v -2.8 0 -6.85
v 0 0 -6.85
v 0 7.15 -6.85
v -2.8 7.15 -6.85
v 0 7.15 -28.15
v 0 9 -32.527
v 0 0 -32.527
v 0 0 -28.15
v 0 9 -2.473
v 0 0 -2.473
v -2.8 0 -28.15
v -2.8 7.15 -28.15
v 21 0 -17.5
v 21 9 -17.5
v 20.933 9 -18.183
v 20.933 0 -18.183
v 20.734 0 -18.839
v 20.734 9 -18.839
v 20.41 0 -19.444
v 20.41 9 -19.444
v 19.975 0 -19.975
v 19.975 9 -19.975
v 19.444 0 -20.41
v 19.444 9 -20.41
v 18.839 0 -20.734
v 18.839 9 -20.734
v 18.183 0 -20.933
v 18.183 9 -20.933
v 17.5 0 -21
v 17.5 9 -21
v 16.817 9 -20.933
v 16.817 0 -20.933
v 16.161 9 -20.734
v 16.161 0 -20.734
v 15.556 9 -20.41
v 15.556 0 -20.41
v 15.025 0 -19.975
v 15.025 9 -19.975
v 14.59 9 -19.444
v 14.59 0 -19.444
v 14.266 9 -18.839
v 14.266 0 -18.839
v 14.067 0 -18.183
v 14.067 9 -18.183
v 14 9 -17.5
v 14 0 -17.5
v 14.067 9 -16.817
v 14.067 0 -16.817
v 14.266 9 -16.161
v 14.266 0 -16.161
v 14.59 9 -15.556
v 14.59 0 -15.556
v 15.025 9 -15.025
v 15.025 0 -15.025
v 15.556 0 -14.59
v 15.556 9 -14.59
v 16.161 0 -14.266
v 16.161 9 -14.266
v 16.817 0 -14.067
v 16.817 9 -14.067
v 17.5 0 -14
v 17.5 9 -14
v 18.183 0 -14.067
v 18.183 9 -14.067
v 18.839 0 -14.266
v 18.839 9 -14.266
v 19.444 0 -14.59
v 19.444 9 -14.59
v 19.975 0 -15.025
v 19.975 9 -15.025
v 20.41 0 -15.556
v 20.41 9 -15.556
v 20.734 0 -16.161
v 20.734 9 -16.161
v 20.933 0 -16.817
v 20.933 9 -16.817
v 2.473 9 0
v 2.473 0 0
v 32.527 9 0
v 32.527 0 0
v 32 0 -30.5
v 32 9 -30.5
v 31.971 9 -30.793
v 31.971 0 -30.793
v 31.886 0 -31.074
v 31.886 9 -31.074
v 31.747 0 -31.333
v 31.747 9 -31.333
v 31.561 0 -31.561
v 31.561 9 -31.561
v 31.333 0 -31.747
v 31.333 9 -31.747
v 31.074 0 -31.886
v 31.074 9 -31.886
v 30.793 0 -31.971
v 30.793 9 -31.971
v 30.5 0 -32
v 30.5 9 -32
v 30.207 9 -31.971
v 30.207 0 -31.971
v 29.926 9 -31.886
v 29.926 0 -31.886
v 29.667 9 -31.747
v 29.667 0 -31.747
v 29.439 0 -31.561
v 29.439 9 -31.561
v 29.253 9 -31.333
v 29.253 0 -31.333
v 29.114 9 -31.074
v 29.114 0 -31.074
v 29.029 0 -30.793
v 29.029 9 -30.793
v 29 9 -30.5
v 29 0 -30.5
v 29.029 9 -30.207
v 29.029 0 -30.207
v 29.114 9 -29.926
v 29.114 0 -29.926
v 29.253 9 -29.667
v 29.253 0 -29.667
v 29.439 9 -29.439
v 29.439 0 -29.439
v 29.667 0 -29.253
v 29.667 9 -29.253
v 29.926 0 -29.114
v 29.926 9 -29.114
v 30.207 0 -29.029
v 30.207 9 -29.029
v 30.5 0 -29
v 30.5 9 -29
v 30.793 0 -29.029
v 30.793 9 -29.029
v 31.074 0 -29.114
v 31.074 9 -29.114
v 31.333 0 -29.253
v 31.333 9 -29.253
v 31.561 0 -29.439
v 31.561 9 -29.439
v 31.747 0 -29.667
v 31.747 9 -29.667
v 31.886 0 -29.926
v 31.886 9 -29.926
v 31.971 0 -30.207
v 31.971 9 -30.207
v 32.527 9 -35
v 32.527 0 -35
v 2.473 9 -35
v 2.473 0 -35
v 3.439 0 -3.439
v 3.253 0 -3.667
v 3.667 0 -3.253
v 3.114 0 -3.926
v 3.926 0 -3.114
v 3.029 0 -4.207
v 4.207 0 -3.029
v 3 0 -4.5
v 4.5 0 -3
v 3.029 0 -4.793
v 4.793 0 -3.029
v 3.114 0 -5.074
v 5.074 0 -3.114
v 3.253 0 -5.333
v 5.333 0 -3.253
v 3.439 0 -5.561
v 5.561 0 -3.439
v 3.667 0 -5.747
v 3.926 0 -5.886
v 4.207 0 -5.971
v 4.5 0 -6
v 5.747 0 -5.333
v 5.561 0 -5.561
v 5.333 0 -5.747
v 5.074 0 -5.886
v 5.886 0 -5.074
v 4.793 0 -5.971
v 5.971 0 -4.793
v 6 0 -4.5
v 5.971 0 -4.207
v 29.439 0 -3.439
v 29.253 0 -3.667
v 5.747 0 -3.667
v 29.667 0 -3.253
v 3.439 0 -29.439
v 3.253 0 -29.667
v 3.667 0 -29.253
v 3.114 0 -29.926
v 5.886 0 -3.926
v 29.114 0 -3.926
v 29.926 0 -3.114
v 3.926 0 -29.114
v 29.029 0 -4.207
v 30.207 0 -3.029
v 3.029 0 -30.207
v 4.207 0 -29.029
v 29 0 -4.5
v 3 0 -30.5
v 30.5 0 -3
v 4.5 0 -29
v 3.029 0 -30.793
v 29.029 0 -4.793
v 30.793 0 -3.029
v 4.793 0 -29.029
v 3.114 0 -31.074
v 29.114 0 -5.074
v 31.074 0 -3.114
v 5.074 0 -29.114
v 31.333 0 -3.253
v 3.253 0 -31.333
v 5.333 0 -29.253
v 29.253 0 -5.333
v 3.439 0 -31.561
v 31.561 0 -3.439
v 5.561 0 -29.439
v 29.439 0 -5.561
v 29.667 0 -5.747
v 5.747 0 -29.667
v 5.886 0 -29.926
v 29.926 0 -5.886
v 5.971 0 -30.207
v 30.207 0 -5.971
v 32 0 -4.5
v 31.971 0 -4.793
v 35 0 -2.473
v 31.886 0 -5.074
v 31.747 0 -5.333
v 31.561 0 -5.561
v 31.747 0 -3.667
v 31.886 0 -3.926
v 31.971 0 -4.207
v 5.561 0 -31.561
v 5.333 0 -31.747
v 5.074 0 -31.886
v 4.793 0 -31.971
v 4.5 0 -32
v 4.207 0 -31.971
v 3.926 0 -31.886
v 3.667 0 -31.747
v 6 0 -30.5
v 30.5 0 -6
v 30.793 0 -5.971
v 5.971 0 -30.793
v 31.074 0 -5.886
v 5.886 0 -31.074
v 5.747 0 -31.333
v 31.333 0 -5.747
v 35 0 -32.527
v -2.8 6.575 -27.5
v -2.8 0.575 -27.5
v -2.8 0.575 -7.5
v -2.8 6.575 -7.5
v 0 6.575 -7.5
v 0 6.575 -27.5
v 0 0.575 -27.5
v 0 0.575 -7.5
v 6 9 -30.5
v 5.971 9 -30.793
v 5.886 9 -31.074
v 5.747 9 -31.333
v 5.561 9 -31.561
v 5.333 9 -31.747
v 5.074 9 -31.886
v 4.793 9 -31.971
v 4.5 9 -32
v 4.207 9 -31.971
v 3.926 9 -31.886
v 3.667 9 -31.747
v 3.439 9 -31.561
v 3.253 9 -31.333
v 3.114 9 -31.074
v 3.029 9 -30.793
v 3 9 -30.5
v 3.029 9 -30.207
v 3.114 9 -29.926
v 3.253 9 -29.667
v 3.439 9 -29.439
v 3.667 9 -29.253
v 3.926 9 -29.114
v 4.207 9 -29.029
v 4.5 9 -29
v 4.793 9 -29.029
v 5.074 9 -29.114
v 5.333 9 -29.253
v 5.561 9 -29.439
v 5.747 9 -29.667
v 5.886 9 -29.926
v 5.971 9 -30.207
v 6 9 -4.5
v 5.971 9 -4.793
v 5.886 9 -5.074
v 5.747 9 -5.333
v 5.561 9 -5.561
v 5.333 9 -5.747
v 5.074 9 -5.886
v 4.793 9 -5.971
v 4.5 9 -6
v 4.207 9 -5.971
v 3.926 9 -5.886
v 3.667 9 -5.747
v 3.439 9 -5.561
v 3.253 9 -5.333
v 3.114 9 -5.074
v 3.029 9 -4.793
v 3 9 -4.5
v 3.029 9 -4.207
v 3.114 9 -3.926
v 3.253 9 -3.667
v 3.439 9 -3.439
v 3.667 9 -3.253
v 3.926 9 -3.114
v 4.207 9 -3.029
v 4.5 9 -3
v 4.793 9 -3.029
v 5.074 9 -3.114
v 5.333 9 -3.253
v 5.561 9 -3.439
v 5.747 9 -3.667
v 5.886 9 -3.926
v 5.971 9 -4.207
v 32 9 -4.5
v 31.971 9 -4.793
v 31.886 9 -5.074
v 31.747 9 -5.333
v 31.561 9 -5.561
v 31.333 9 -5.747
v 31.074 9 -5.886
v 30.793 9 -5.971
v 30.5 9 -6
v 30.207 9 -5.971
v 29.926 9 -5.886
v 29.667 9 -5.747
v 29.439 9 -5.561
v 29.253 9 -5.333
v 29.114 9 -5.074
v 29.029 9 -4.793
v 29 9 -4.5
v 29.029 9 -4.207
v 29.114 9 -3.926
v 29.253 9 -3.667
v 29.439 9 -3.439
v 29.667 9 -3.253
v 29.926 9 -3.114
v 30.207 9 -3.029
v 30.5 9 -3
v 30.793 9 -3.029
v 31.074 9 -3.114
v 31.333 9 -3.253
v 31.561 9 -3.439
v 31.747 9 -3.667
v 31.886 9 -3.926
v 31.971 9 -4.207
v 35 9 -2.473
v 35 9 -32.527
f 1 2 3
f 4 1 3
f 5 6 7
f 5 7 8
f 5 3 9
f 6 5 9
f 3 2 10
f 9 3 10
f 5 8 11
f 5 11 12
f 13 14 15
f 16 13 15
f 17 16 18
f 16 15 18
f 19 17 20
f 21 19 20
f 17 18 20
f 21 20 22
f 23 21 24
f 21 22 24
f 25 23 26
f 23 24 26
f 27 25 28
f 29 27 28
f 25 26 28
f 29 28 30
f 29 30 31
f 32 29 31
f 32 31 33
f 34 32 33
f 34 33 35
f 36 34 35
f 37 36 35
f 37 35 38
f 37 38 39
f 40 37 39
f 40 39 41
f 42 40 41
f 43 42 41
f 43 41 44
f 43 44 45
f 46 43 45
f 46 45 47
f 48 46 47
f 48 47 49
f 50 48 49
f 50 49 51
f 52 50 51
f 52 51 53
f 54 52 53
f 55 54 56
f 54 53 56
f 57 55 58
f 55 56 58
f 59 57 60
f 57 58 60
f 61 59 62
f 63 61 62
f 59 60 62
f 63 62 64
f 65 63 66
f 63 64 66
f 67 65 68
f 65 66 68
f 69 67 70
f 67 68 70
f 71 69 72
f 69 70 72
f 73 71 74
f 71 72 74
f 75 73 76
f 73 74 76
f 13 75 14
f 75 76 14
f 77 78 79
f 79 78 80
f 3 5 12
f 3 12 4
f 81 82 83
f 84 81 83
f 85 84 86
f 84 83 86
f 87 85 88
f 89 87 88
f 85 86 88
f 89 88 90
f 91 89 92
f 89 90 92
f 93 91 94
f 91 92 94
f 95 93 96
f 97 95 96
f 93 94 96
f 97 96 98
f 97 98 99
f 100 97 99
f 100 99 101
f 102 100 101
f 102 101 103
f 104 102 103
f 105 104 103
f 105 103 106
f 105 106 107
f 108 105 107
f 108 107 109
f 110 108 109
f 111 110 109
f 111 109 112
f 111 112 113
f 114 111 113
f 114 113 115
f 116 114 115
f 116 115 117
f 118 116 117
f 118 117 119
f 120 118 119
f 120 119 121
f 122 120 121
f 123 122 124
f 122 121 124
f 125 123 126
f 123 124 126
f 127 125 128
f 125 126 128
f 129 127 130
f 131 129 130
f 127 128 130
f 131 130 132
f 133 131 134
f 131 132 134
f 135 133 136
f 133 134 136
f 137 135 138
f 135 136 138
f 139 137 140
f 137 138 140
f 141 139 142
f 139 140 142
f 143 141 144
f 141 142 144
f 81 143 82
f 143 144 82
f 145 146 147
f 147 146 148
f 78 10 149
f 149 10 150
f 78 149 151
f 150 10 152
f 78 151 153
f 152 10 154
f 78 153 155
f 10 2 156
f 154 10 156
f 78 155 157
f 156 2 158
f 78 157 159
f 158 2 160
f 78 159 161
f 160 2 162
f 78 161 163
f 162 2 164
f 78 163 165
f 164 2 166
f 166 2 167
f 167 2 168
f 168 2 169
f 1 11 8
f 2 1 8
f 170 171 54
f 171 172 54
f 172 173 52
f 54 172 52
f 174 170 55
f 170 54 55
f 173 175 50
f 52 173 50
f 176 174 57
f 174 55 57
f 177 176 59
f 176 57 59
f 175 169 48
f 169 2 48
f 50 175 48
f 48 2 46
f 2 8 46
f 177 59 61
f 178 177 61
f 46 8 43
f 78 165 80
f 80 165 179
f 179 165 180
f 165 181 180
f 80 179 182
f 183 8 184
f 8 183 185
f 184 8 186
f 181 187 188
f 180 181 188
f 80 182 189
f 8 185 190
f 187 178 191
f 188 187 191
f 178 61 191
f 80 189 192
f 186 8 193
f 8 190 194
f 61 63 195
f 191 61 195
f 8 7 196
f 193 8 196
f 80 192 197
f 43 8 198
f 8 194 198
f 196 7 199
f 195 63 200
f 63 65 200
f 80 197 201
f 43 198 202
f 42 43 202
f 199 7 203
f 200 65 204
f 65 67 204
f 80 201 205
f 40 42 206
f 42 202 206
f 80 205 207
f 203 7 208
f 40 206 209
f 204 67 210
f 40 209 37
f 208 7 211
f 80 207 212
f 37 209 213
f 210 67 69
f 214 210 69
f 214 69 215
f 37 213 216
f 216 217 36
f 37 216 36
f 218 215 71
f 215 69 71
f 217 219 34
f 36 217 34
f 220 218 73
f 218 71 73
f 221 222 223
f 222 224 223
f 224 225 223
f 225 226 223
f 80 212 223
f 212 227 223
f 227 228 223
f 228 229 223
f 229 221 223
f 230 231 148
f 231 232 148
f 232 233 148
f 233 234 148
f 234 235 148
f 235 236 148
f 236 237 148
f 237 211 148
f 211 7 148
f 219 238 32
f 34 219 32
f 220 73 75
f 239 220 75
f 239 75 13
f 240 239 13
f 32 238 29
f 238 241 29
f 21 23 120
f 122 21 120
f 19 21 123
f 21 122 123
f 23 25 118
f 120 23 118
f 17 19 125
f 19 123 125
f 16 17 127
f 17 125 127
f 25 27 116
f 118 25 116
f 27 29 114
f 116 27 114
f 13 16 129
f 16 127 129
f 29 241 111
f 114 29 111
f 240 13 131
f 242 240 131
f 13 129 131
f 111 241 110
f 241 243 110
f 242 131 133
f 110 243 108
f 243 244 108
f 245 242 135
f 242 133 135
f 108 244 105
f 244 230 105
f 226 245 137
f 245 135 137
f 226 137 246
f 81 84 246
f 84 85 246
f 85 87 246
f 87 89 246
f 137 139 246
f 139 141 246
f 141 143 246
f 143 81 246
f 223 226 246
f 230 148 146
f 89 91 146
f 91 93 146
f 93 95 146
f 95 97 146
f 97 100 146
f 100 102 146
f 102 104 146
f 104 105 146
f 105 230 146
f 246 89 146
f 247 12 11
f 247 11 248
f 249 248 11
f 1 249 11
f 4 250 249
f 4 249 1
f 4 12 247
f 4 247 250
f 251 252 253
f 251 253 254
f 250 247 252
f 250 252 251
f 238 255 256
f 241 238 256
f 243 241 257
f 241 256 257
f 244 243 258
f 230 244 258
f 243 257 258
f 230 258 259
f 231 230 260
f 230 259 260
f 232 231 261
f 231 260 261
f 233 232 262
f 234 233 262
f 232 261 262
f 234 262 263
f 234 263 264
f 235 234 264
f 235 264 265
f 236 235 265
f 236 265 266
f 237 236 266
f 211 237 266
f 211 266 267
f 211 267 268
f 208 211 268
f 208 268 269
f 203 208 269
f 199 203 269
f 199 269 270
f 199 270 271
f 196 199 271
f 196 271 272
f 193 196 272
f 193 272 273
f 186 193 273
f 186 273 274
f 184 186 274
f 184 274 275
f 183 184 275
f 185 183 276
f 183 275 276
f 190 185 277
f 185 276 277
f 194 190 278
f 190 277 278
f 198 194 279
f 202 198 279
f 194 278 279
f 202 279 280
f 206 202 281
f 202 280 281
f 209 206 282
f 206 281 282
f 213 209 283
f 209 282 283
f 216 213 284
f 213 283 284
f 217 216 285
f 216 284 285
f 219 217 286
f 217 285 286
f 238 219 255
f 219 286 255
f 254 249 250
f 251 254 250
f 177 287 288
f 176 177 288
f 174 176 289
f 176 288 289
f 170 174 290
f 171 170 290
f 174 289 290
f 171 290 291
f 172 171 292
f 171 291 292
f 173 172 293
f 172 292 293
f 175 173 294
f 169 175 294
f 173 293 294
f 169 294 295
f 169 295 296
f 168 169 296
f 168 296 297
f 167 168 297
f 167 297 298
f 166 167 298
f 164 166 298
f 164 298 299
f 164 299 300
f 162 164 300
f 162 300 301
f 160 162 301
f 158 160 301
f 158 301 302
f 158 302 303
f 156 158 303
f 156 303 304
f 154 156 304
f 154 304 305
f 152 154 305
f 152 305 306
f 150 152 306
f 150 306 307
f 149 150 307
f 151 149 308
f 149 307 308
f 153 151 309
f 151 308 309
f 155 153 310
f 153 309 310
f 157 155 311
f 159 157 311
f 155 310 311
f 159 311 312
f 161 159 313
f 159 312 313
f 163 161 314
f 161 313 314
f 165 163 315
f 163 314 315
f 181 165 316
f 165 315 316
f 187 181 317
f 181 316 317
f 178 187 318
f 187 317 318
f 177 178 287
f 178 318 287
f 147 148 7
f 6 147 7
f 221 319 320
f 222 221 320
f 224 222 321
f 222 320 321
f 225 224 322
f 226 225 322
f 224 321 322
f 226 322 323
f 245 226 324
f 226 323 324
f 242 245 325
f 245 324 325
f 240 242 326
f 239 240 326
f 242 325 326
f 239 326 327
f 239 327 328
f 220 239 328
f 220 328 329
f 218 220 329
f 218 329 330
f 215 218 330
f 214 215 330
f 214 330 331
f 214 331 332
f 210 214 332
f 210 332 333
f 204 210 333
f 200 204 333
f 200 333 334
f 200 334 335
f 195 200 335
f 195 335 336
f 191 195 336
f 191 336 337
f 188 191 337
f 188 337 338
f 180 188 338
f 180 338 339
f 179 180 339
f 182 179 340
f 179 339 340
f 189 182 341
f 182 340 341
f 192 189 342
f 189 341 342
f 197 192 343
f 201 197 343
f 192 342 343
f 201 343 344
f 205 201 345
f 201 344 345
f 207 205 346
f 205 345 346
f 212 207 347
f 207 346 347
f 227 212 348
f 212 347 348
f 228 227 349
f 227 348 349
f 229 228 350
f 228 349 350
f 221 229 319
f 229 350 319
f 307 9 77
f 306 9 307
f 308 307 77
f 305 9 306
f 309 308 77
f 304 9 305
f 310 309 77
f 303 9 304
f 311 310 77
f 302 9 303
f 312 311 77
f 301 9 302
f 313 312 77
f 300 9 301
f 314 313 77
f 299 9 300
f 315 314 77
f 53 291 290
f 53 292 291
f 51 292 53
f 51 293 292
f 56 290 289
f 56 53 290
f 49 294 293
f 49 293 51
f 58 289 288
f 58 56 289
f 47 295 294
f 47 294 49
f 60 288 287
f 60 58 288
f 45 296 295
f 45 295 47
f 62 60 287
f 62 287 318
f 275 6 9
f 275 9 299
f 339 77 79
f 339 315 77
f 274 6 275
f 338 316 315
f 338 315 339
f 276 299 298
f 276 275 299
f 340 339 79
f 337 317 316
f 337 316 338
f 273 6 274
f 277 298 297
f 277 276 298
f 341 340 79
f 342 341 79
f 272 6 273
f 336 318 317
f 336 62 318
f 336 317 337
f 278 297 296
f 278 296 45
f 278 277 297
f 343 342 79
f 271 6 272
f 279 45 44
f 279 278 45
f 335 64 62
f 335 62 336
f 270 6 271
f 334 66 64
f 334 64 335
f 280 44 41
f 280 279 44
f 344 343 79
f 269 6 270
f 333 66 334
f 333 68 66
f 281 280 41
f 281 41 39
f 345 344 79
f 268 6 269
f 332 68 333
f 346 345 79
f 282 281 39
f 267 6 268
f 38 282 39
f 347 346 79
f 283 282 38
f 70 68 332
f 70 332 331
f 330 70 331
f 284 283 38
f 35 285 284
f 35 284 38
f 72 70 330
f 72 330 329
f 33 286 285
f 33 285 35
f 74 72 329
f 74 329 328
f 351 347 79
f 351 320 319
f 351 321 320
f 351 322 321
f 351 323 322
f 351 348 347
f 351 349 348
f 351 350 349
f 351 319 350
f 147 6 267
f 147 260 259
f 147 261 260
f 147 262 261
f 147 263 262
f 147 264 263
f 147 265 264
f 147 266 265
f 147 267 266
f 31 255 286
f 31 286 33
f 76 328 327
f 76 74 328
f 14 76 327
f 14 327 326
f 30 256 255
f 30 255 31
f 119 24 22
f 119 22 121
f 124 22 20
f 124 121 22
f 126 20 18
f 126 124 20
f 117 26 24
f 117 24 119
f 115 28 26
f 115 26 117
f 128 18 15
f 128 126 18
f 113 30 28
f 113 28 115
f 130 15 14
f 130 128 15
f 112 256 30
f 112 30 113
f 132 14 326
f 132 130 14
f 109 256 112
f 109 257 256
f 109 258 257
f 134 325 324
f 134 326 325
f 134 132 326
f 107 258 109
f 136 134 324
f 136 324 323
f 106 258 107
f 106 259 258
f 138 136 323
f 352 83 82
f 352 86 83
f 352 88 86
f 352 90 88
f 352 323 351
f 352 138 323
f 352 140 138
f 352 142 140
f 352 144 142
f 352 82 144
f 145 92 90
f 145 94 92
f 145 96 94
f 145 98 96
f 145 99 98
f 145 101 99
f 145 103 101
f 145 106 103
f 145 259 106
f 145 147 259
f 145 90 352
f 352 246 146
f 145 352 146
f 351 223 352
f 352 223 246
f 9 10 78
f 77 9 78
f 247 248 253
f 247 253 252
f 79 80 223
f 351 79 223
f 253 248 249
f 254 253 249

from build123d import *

# Parameters (mm, degrees)
SALIENTE_EXTRUIR1_DEPTH = 9
CROQUIS2_R              = 3.5
CORTAR_EXTRUIR1_DEPTH   = 10
CROQUIS3_R              = 1.5
CORTAR_EXTRUIR2_DEPTH   = 10
SKETCH1_W               = 21.3
SKETCH1_H               = 7.15
BOSS_EXTRUDE1_DEPTH     = 2.8
SKETCH2_W               = 20
SKETCH2_H               = 6
CUT_EXTRUDE1_DEPTH      = 2.8


with BuildPart() as part:
    # Croquis1 → Saliente-Extruir1 (new body)
    with BuildSketch(Plane(origin=(0, 0, 0), x_dir=(1, 0, 0), z_dir=(0, 1, 0))):
        Polygon((0, 2.473088065), (2.473088065, 0), (32.526911935, 0), (35, 2.473088065), (35, 32.526911935), (32.526911935, 35), (2.473088065, 35), (0, 32.526911935), align=None)
    extrude(amount=SALIENTE_EXTRUIR1_DEPTH)

    # Croquis2 → Cortar-Extruir1 (cut, through all)
    with BuildSketch(Plane(origin=(0, 9, 0), x_dir=(1, 0, 0), z_dir=(0, 1, 0))):
        with Locations((17.5, 17.5)):
            Circle(CROQUIS2_R)
    extrude(amount=-CORTAR_EXTRUIR1_DEPTH, mode=Mode.SUBTRACT)

    # Croquis3 → Cortar-Extruir2 (cut, through all)
    with BuildSketch(Plane(origin=(0, 9, 0), x_dir=(1, 0, 0), z_dir=(0, 1, 0))):
        with Locations((4.5, 30.5)):
            Circle(CROQUIS3_R)
        with Locations((30.5, 30.5)):
            Circle(CROQUIS3_R)
        with Locations((30.5, 4.5)):
            Circle(CROQUIS3_R)
        with Locations((4.5, 4.5)):
            Circle(CROQUIS3_R)
    extrude(amount=-CORTAR_EXTRUIR2_DEPTH, mode=Mode.SUBTRACT)

    # Sketch1 → Boss-Extrude1 (add)
    with BuildSketch(Plane.ZY):
        with Locations((-17.5, 3.575)):
            Rectangle(SKETCH1_W, SKETCH1_H)
    extrude(amount=BOSS_EXTRUDE1_DEPTH)

    # Sketch2 → Cut-Extrude1 (cut)
    with BuildSketch(Plane.ZY.offset(2.8)):
        with Locations((-17.5, 3.575)):
            Rectangle(SKETCH2_W, SKETCH2_H)
    extrude(amount=-CUT_EXTRUDE1_DEPTH, mode=Mode.SUBTRACT)


solid = part.part
